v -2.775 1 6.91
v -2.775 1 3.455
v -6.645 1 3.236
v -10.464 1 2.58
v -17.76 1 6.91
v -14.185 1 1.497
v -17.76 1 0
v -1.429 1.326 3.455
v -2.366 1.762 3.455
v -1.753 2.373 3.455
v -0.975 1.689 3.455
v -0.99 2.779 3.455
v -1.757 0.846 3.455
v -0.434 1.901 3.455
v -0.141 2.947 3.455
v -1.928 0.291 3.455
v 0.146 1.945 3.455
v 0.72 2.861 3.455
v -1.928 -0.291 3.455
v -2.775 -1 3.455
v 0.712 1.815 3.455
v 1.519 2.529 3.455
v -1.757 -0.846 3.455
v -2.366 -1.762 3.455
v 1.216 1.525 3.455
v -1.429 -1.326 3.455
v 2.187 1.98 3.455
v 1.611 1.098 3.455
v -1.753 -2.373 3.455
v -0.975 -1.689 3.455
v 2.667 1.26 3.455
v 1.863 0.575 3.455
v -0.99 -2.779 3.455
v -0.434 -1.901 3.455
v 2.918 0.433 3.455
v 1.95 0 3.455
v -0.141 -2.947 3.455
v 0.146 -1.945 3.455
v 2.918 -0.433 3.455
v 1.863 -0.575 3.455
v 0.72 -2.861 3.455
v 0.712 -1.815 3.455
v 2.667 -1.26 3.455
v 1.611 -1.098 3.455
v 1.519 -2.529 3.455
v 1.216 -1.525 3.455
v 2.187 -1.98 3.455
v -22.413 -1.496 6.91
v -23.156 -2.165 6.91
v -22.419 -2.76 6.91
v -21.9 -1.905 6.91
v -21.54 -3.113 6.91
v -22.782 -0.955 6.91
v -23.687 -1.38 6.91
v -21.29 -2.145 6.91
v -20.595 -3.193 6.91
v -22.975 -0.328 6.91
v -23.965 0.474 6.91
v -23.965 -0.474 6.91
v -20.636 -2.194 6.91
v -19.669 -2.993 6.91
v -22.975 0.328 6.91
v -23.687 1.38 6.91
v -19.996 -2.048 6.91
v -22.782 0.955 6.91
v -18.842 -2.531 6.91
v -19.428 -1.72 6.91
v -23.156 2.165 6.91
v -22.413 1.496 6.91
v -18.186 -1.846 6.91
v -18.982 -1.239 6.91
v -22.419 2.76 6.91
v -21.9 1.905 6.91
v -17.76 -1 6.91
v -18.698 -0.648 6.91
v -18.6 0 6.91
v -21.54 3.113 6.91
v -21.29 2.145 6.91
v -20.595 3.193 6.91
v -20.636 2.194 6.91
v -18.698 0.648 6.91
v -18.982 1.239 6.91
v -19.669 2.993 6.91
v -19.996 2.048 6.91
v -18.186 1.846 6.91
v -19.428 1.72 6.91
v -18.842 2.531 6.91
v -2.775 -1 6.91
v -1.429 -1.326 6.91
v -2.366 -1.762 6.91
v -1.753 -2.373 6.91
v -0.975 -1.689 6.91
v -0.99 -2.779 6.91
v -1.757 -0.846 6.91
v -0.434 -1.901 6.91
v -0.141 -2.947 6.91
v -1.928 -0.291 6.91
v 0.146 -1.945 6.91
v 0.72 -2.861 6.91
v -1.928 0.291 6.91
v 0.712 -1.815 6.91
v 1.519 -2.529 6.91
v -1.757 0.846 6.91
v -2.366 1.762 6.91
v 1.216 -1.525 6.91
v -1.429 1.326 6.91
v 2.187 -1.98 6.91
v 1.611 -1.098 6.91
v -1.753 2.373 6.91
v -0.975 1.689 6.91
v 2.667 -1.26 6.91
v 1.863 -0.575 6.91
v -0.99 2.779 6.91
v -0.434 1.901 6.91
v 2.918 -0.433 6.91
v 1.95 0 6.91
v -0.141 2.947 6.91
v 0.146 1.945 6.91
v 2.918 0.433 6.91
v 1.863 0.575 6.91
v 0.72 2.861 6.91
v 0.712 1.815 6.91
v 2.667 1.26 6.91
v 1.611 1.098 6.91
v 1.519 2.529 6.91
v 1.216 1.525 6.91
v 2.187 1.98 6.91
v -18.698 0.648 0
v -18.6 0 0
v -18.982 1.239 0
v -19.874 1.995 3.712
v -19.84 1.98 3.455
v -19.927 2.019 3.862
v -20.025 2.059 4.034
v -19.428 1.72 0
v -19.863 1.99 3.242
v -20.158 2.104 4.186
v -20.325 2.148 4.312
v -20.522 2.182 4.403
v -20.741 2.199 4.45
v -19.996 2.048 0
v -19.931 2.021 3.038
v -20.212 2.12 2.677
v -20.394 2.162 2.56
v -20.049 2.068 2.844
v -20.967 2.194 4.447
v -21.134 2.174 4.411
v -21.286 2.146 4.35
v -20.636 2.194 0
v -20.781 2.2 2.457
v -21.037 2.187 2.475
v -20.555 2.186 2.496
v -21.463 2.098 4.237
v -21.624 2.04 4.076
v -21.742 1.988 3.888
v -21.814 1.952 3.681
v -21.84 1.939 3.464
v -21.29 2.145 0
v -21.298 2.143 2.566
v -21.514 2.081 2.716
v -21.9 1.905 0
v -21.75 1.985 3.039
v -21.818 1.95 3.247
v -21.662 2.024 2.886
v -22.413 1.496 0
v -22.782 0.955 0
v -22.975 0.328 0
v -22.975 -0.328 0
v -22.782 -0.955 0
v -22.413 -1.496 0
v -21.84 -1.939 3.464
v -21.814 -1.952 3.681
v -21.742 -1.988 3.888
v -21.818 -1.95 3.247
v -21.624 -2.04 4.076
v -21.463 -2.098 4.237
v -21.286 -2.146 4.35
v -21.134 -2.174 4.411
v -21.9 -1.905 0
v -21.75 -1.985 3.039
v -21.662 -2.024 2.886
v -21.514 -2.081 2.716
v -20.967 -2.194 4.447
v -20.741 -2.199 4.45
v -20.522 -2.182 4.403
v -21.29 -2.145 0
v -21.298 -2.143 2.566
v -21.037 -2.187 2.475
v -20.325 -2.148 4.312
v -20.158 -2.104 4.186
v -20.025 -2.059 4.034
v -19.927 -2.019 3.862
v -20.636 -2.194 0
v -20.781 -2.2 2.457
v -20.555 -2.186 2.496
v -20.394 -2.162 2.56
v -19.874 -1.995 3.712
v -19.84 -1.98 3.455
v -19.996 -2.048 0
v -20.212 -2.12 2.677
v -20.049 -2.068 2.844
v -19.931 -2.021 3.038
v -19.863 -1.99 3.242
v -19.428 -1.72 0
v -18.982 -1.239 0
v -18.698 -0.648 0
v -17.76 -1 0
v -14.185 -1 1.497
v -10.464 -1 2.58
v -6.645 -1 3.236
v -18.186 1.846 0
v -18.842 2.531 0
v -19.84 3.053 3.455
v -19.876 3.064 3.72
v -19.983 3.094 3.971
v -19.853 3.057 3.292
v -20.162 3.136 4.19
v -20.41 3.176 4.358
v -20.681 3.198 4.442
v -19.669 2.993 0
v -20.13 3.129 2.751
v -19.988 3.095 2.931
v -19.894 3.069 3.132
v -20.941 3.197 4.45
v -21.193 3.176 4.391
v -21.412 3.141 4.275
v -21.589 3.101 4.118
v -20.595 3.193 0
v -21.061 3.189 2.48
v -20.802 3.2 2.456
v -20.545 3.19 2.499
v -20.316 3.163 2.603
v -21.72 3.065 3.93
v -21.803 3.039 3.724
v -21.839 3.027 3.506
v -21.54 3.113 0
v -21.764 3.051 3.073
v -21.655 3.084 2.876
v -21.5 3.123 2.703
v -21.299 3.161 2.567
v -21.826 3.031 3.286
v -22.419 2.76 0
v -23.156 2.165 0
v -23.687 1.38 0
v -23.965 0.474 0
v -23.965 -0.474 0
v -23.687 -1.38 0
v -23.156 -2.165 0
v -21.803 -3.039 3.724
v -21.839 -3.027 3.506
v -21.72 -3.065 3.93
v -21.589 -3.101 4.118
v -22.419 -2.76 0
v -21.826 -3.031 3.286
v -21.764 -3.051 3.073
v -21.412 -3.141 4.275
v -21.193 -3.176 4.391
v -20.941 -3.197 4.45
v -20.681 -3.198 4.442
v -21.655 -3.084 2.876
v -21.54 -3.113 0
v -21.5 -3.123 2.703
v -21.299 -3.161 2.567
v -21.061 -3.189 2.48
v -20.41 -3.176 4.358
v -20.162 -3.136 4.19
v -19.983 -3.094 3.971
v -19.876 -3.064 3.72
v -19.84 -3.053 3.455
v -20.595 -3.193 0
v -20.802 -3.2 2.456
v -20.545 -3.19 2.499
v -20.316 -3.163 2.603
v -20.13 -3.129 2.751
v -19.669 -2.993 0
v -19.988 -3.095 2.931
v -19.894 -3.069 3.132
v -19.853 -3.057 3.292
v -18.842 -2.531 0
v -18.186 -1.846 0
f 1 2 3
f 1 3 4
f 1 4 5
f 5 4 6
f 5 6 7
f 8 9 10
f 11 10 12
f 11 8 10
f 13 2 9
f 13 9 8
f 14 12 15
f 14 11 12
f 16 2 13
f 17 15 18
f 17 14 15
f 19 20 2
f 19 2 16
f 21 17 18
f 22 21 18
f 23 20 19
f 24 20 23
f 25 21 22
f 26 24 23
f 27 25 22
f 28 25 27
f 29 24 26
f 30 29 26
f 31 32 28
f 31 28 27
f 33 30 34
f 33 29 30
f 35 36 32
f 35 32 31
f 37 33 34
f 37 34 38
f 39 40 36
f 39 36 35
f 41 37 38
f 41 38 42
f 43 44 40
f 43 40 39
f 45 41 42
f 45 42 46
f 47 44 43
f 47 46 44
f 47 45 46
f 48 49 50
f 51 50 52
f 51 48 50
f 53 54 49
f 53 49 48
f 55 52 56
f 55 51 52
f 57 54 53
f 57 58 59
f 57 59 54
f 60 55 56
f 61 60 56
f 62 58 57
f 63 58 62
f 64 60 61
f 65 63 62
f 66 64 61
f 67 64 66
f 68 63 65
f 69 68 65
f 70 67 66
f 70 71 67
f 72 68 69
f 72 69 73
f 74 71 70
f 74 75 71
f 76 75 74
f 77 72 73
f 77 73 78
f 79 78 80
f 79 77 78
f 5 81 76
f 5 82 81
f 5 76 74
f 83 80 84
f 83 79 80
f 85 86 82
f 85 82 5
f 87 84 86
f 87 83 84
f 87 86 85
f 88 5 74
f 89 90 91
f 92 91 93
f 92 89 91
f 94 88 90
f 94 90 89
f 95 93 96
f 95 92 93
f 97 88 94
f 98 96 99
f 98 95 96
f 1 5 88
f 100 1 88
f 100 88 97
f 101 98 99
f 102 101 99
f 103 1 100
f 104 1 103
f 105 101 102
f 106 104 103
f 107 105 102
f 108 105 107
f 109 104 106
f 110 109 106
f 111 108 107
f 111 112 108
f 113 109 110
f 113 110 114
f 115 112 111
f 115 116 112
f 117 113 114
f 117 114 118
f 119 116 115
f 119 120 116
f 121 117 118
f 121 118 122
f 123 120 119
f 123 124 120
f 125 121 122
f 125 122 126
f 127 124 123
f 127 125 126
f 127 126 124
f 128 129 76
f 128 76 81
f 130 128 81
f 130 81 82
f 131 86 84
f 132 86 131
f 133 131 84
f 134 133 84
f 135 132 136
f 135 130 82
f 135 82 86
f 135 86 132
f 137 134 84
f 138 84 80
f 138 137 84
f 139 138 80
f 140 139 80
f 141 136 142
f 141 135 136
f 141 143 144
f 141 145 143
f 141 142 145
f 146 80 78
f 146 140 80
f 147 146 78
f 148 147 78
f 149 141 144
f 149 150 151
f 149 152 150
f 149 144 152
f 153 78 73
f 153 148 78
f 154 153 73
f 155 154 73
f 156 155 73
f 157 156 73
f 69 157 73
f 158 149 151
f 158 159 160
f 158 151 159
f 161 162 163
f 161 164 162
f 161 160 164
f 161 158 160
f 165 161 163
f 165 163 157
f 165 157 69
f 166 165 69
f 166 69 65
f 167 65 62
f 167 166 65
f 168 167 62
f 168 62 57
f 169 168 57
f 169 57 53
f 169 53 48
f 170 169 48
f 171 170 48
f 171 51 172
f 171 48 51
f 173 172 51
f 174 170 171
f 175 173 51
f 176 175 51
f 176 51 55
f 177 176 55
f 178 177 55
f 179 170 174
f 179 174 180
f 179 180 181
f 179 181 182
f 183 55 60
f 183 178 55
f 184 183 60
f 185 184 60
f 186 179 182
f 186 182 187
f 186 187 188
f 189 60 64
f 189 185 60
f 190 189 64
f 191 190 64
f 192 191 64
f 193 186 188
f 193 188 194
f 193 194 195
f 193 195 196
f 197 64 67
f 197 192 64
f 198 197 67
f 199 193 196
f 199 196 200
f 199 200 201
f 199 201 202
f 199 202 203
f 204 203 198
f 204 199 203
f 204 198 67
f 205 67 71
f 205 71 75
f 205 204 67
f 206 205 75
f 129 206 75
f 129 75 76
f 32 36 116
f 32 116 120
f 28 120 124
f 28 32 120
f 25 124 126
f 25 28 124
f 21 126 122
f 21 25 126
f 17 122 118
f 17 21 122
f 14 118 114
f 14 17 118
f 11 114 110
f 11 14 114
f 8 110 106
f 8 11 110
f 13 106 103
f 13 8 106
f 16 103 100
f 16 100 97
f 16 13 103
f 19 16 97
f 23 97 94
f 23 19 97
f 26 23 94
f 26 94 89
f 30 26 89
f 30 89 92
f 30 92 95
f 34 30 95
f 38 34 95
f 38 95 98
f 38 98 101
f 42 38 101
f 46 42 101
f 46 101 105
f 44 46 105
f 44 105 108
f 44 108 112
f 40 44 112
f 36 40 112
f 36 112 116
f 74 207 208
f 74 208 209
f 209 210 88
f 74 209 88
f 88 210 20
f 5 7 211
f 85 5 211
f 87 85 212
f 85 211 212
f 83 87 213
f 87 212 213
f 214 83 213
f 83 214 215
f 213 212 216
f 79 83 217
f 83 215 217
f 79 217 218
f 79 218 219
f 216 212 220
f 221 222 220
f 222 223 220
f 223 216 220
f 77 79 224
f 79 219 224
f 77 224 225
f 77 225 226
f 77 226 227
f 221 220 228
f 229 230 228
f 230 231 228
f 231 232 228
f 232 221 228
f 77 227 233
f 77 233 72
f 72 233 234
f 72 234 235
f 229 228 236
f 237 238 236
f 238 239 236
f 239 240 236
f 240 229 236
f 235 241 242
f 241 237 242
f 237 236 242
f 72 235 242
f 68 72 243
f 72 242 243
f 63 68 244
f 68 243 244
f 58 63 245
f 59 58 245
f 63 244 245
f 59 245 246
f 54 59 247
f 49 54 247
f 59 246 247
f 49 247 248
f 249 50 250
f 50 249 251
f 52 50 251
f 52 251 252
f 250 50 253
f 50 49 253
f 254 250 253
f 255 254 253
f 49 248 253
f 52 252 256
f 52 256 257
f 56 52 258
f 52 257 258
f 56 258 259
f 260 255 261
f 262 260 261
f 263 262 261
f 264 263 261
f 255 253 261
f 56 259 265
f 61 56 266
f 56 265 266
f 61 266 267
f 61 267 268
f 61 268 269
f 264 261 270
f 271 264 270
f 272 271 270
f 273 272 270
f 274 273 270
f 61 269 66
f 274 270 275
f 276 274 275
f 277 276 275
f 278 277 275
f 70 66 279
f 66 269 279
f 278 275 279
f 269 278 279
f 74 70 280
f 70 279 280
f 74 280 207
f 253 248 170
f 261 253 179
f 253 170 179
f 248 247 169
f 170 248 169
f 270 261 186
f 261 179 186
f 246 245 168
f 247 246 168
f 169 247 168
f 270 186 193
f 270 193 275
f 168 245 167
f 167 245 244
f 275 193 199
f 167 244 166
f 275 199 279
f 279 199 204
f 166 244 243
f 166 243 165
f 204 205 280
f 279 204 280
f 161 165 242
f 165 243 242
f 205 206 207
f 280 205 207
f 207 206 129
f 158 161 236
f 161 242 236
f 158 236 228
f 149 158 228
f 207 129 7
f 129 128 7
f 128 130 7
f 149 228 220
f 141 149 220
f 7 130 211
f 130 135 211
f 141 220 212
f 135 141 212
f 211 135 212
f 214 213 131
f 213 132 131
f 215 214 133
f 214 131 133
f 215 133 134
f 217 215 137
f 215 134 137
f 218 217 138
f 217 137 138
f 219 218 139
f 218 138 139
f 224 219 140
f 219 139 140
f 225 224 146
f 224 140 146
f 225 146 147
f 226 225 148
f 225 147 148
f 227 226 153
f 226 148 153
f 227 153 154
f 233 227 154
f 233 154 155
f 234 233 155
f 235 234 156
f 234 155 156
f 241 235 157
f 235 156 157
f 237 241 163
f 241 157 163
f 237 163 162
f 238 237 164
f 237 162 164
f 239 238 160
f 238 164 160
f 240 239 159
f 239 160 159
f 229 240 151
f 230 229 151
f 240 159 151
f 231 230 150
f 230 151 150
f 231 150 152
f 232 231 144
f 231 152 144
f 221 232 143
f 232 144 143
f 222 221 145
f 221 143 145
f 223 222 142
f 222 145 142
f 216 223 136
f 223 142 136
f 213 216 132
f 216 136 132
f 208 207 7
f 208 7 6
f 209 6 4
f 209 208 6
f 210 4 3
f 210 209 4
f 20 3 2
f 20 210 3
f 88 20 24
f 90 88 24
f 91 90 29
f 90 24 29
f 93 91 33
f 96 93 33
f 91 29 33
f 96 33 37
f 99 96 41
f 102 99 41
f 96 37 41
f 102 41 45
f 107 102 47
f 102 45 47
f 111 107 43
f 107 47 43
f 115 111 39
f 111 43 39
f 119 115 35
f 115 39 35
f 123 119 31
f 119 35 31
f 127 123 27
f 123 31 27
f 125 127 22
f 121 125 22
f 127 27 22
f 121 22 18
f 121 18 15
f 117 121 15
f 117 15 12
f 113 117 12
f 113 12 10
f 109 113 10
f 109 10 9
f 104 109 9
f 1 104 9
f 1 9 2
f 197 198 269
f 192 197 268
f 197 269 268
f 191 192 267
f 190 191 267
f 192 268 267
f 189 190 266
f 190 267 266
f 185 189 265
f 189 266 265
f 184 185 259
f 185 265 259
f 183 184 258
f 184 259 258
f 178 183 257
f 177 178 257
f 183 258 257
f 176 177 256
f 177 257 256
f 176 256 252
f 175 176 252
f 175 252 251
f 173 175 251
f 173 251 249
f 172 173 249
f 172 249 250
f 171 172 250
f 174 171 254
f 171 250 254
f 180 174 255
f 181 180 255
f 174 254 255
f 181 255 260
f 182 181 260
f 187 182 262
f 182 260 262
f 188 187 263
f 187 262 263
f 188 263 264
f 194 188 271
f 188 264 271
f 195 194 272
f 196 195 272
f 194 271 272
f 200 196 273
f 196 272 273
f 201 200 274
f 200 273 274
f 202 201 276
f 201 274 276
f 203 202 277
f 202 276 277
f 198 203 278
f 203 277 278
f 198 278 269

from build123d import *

# Parameters (mm, degrees)
SKETCH1_R              = 1.95
SKETCH1_R_2            = 2.2
MAIN_BODY_DEPTH        = 6.91
SKETCH2_R              = 1
TENDON_HOLE_DEPTH      = 10
MATERIAL_REMOVAL_DEPTH = 5


with BuildPart() as part:
    # Sketch1 → main body (new body)
    with BuildSketch(Plane.XY):
        with BuildLine():
            Line((-17.760263169, -1), (-2.775337817, -1))
            ThreePointArc((-2.775337817, -1), (2.95, 0), (-2.775337817, 1))
            Line((-2.775337817, 1), (-17.760263169, 1))
            ThreePointArc((-17.760263169, 1), (-24, 0), (-17.760263169, -1))
        make_face()
        Circle(SKETCH1_R, mode=Mode.SUBTRACT)
        with Locations((-20.8, 0)):
            Circle(SKETCH1_R_2, mode=Mode.SUBTRACT)
    extrude(amount=MAIN_BODY_DEPTH)

    # Sketch2 → tendon hole (cut, symmetric)
    with BuildSketch(Plane.XZ.offset(1)):
        with Locations((-20.840065792, 3.455)):
            Circle(SKETCH2_R)
    extrude(amount=TENDON_HOLE_DEPTH, both=True, mode=Mode.SUBTRACT)

    # Sketch3 → material removal (cut, symmetric)
    with BuildSketch(Plane.XZ.offset(1)):
        with BuildLine():
            Line((-2.775337817, 3.455), (2.95, 3.455))
            Line((2.95, 3.455), (2.95, 0))
            Line((2.95, 0), (-2.775337817, 0))
            Line((-2.775337817, 0), (-17.760263169, 0))
            ThreePointArc((-17.760263169, 0), (-10.464372425, 2.580066057), (-2.775337817, 3.455))
        make_face()
    extrude(amount=MATERIAL_REMOVAL_DEPTH, both=True, mode=Mode.SUBTRACT)


solid = part.part
